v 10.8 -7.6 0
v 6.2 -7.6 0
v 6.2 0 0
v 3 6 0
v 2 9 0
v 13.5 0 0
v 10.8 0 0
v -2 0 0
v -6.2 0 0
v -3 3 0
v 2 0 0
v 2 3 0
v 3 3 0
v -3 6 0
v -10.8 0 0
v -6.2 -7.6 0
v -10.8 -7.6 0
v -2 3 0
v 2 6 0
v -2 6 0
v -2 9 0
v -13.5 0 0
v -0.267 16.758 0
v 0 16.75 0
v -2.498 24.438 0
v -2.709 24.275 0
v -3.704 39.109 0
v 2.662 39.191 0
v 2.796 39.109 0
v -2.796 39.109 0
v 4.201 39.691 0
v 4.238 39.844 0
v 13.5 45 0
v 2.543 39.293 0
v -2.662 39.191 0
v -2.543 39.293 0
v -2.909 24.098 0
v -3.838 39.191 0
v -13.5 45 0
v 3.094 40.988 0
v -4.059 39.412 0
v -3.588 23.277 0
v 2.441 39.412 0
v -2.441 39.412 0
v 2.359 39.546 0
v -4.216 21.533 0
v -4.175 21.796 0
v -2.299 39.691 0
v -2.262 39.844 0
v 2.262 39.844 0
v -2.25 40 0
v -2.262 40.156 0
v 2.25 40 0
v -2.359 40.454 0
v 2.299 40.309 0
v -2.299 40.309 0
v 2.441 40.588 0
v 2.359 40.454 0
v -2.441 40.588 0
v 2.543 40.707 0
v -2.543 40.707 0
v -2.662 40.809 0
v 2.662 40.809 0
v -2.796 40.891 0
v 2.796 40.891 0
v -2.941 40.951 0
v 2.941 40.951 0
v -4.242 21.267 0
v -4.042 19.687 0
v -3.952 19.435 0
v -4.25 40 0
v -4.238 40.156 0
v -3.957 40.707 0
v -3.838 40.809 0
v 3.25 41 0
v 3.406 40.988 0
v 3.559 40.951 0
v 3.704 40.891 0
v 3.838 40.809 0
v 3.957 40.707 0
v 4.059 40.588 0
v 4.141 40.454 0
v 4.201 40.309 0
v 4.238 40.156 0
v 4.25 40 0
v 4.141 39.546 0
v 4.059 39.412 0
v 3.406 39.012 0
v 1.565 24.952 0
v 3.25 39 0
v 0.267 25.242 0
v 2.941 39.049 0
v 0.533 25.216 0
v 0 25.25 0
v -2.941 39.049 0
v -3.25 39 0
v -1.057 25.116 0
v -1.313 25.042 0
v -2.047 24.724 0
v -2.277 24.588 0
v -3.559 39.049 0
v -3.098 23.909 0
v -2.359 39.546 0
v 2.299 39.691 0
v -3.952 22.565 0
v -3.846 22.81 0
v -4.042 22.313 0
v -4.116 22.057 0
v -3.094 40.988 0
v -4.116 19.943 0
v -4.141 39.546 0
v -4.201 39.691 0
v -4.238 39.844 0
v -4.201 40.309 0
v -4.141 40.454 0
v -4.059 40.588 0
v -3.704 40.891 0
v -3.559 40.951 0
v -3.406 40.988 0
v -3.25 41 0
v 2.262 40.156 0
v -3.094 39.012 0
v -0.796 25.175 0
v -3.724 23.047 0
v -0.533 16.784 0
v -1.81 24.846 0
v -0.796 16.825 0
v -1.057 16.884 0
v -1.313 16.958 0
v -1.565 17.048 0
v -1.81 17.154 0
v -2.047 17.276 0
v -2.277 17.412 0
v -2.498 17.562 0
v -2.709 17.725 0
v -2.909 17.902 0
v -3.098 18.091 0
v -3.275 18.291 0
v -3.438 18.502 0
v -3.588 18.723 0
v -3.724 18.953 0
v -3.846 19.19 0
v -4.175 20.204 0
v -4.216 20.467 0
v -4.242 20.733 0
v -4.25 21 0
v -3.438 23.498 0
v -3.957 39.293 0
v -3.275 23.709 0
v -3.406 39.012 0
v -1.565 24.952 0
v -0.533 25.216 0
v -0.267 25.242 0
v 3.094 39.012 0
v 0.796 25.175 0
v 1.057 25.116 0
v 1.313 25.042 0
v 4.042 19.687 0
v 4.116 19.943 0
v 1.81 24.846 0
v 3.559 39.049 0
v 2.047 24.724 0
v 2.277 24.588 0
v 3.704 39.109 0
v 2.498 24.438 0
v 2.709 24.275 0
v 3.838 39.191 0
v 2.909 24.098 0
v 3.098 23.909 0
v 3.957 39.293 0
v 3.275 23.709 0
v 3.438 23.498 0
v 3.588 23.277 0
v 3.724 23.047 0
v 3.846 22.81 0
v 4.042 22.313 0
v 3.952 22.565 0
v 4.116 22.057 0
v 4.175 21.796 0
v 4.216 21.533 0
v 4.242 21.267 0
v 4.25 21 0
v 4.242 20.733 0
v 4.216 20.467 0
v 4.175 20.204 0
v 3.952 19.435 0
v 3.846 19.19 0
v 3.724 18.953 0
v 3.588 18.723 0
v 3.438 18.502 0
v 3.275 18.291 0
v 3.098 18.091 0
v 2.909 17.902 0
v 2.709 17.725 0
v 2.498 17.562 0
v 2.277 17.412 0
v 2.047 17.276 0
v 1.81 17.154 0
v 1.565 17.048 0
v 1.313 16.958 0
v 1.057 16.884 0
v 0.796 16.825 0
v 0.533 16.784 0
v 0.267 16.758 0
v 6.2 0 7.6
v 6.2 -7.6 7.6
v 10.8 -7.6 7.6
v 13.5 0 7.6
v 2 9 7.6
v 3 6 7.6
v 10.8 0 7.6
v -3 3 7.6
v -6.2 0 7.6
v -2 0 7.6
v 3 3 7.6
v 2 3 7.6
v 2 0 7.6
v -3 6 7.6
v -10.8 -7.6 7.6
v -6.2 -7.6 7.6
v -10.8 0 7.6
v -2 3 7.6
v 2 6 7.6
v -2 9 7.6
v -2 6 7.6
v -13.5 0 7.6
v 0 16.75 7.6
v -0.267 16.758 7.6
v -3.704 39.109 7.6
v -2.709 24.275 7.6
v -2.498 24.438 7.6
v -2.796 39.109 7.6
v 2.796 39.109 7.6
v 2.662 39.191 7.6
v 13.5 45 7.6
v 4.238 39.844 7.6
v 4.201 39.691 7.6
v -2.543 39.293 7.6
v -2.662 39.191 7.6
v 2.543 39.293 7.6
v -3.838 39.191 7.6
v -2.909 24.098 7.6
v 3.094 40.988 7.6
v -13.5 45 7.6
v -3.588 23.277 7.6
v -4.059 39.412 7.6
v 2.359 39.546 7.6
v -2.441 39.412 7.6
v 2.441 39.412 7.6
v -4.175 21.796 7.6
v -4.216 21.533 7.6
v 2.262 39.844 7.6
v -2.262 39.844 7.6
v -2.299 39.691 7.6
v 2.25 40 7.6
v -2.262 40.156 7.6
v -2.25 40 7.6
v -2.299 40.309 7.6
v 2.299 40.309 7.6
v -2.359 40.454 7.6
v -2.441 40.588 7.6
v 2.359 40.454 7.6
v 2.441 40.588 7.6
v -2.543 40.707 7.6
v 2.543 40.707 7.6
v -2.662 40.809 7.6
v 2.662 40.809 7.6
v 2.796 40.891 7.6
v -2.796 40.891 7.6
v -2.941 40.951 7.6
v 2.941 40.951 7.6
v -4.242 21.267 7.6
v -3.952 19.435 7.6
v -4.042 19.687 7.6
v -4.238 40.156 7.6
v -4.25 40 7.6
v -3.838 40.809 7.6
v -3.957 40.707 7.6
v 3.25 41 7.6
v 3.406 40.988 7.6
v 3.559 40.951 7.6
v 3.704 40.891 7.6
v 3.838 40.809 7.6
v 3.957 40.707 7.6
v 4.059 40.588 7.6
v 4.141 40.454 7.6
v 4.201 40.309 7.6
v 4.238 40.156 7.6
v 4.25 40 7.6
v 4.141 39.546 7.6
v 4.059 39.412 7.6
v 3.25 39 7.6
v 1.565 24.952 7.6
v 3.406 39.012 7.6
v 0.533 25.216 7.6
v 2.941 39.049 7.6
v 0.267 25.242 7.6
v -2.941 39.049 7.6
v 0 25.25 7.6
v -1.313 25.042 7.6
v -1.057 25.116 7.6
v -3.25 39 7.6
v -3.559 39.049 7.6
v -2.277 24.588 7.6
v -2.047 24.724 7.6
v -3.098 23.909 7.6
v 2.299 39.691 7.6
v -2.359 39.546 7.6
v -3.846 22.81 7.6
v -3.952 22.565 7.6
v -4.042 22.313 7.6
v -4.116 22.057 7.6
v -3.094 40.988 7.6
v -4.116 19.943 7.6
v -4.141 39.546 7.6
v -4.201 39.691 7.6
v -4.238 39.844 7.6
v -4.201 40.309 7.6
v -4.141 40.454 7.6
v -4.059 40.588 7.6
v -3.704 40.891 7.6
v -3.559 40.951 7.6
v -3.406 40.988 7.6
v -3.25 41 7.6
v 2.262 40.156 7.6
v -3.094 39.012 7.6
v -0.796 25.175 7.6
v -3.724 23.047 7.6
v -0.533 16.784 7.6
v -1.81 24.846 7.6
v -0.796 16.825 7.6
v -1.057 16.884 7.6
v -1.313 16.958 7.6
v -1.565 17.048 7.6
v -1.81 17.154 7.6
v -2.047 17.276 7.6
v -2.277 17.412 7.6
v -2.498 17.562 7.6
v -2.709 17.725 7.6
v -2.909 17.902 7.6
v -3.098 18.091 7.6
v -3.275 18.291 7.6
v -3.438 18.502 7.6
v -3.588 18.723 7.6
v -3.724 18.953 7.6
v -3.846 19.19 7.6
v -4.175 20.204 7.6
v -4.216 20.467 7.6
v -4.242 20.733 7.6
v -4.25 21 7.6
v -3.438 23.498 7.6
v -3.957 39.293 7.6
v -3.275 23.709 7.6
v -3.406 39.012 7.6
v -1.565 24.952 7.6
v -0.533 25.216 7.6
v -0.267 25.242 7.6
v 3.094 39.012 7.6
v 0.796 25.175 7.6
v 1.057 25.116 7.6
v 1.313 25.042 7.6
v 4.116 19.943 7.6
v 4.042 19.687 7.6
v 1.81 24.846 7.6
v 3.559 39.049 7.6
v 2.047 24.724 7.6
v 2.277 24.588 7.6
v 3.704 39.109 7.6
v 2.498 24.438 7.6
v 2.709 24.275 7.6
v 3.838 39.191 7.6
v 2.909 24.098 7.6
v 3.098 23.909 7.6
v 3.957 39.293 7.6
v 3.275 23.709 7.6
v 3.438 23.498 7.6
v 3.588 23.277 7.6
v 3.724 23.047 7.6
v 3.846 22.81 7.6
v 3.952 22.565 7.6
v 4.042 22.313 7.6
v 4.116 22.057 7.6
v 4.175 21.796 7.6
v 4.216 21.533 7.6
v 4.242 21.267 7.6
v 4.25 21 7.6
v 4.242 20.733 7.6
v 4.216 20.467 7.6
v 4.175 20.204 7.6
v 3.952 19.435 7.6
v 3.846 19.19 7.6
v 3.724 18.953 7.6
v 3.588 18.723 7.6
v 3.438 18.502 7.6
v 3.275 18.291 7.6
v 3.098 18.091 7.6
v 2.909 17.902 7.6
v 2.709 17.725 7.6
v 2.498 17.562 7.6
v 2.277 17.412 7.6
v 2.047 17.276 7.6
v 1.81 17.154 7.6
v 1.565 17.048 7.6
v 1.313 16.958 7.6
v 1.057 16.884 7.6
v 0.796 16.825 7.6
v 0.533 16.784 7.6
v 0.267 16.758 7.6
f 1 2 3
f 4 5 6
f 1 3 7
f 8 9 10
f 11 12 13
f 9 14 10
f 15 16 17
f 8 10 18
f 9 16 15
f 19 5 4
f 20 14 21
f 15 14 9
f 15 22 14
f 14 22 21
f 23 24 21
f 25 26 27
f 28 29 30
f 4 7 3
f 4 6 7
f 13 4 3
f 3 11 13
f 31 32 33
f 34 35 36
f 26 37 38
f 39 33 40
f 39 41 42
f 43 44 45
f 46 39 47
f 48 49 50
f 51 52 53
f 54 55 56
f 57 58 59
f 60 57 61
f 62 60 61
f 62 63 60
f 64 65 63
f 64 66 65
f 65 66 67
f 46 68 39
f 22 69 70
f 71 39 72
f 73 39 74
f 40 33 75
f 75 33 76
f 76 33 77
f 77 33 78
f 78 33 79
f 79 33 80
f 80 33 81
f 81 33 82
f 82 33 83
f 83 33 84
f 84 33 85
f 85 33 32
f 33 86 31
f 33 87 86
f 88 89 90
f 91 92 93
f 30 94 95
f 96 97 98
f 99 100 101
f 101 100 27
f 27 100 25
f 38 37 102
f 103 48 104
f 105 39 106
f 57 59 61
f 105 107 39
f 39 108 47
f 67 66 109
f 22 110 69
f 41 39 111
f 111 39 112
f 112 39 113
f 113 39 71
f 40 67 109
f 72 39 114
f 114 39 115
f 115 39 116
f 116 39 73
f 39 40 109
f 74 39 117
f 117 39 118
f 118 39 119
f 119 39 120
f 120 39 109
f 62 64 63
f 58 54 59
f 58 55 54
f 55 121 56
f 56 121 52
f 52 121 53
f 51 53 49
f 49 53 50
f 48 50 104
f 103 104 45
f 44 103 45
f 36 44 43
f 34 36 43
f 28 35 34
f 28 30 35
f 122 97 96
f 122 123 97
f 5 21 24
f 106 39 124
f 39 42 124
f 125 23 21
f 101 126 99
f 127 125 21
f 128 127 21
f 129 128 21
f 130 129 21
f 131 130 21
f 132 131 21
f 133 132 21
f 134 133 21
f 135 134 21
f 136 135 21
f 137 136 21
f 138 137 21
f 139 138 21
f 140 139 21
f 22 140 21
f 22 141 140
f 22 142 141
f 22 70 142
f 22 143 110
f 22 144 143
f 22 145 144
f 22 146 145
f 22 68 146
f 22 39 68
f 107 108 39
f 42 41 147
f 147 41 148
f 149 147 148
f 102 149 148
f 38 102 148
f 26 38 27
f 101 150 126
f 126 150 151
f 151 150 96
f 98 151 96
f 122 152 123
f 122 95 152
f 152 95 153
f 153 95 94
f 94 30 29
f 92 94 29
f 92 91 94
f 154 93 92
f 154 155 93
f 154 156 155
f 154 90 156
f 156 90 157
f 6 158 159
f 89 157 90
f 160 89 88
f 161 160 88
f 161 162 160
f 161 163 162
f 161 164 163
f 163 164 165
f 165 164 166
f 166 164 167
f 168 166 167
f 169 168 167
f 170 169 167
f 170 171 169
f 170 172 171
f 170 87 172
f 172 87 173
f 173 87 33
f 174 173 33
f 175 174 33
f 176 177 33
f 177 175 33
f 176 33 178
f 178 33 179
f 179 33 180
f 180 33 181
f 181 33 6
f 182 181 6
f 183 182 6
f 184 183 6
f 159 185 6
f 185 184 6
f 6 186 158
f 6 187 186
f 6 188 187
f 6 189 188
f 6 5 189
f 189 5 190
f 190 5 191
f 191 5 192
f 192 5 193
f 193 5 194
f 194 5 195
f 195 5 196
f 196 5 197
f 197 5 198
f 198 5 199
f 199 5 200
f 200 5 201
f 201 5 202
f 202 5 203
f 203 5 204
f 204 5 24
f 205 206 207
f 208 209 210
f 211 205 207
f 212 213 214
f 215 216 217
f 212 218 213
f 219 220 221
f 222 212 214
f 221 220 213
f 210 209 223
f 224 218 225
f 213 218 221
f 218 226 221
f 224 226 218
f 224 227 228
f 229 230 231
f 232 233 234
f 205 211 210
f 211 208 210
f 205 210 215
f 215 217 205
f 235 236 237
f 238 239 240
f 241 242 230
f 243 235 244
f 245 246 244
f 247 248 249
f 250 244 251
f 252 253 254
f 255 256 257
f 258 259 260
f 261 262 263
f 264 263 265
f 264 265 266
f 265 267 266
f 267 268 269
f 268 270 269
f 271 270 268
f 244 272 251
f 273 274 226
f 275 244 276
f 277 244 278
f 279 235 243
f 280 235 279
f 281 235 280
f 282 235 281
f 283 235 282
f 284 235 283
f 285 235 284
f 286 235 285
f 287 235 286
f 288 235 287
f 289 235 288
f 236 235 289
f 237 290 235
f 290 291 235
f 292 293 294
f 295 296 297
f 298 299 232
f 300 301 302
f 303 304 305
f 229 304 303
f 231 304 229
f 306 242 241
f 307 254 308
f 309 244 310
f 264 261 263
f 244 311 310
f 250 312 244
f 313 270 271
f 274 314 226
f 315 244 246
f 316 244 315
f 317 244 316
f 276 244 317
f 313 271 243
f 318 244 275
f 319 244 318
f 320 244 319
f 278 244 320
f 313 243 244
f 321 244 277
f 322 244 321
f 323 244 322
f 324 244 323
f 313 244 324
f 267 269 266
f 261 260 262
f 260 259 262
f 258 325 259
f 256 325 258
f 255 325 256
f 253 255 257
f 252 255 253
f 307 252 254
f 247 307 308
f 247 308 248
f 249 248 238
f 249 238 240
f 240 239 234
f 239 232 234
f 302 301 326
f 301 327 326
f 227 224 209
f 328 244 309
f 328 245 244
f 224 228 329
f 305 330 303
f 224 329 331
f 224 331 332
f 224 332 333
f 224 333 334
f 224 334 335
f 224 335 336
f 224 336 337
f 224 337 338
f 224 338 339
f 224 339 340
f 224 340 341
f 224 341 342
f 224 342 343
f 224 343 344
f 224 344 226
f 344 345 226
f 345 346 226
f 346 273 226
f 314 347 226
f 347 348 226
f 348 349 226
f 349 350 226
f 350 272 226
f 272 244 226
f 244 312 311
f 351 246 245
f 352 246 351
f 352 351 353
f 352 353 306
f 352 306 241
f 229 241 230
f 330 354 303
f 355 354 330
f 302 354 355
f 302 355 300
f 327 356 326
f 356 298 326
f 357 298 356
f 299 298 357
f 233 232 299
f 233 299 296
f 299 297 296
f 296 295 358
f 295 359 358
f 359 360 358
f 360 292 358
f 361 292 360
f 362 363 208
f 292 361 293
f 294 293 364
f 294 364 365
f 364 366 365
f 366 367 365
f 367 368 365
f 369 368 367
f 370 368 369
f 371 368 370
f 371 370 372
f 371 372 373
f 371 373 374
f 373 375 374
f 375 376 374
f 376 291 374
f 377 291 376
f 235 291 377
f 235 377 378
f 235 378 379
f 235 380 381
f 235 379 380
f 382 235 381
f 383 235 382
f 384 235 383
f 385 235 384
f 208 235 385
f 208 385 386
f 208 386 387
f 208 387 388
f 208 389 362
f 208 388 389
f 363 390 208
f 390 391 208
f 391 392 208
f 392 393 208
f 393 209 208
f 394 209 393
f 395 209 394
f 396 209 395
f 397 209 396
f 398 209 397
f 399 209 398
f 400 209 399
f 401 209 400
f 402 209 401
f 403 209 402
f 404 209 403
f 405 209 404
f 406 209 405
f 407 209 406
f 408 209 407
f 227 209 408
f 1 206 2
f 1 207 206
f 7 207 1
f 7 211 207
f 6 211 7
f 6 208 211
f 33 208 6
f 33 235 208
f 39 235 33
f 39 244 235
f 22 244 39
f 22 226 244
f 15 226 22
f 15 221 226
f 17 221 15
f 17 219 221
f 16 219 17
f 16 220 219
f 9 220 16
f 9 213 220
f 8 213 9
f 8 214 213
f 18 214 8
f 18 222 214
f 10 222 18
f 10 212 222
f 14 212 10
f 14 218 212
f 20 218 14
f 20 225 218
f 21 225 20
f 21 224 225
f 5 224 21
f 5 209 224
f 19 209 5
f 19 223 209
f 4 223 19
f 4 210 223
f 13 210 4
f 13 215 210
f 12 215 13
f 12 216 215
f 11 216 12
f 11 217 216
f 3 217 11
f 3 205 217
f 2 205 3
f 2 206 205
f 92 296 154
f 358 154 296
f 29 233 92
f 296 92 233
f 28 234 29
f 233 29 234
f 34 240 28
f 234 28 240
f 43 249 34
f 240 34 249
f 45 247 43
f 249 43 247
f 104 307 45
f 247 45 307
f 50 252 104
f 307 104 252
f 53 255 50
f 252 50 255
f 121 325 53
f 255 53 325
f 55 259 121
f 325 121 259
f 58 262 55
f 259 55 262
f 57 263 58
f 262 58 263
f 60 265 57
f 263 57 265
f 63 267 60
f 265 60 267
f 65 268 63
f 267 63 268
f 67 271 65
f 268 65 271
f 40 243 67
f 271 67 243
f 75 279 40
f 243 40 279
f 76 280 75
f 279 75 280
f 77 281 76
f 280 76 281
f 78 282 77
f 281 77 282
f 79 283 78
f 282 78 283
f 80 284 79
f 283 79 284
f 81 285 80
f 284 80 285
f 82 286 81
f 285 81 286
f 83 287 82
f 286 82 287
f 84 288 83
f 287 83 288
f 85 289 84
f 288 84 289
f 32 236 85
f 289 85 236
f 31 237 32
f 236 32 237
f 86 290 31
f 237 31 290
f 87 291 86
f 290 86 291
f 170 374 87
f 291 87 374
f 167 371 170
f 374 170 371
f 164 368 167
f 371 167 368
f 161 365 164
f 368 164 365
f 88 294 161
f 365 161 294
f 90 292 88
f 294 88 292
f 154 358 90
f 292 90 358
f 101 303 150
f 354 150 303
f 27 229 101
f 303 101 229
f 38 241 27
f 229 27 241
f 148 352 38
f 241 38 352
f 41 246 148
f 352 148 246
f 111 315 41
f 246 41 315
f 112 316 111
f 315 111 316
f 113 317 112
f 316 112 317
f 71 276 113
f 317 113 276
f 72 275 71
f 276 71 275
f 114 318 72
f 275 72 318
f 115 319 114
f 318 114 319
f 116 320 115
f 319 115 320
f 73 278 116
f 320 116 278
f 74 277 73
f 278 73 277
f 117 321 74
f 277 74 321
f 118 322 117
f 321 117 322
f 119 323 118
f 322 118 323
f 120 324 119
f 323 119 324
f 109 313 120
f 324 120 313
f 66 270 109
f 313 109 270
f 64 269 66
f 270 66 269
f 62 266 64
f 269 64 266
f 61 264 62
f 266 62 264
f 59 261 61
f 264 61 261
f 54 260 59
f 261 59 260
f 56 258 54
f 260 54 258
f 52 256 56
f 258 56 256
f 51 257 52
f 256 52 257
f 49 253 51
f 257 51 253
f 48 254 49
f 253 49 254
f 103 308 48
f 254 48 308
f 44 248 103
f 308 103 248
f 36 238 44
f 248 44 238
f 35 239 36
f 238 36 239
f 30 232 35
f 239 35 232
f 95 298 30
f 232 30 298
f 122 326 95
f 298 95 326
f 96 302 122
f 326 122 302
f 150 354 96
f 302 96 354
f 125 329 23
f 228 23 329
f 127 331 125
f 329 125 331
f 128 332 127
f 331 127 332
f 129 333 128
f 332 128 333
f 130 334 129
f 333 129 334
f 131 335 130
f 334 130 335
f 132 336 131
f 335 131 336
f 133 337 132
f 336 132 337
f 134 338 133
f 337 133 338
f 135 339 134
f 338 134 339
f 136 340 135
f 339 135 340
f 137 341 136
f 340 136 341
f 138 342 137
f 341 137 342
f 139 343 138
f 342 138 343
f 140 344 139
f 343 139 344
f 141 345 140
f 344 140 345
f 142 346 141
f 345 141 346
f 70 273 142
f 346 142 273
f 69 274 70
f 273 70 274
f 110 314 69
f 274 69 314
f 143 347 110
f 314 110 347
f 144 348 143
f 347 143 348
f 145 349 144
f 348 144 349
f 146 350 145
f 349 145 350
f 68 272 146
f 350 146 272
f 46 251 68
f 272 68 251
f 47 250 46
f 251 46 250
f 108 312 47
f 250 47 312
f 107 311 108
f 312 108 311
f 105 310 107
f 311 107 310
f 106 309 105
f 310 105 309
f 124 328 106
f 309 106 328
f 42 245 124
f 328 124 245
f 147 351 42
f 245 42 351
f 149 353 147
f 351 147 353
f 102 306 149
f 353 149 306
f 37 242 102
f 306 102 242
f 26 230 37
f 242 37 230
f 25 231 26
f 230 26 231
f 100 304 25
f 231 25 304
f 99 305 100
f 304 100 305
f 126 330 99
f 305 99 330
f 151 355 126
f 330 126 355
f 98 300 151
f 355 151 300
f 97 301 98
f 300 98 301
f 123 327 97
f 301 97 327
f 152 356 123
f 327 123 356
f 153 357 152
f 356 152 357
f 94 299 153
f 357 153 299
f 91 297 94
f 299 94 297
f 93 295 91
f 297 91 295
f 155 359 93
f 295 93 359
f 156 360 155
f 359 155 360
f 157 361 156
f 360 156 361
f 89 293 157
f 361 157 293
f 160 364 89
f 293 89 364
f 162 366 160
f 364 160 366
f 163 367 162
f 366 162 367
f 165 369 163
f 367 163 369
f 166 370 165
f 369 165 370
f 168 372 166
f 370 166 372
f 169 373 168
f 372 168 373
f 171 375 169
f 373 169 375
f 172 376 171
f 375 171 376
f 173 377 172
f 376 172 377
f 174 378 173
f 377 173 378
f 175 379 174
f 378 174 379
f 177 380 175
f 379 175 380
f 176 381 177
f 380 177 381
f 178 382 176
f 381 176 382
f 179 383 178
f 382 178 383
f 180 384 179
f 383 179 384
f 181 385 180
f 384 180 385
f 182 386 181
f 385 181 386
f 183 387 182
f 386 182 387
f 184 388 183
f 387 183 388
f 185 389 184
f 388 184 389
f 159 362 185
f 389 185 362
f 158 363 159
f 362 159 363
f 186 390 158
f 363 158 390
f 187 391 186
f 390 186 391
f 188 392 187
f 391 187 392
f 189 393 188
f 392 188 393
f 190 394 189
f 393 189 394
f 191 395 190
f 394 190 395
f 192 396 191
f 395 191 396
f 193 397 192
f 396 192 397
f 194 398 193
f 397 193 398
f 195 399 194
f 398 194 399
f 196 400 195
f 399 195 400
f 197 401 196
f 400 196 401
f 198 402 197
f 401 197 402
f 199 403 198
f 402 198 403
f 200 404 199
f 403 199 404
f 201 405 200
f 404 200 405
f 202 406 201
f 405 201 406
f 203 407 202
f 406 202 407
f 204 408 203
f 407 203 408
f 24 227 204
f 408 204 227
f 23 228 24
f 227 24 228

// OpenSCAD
/* 
Author: Kevin Lutzer
Date: February 28 2016 
Description: A part that is meant to hold a limit switch for the positive limit of the y-axis, as well as the bearing. 
Notes: All parts are centered on the positive y-axis onless otherwise specified.

*/

///////////////////////////////// Parameters //////////////////////////////////

//////////////////// Frame Dependant Dimensions 

// thickness of frame material 
thickness = 7.6;
// width of insert that goes into the frame 
frame_insert_width = 4.6;
// dimensions of the base of the part
base_height = 45;
base_width = 27;
// dimensions and position of the bearing, measured from the base of the y-axis 
bearing_displacement = 21;
bearing_hole_diam = 8.5;
// dimensions of screws and nuts used in the joints
screw_height = 9;
screw_width = 4;
nut_height = 3;
nut_width = 6;
// distance between the two frame inserts 
joint_displacement = 8.5;
// dimensions and positions of the limit switch
switch_screw_diam = 2;
switch_screw_width_displacement = 6.5;
switch_screw_height_displacement = 5;


///////////////////////////////// Prototype ////////////////////////////////////

linear_extrude(height = thickness, center = thickness/2, convexity = 10, twist = 0){
    frame();
}

///////////////////////////////// Modules /////////////////////////////////////

// the 2d module of the frame, it needs to be linearly extruded to get the final 3D model of the part
module frame(){
    difference(){
        union(){
            base();    
            translate([-joint_displacement, 0, 0]){
                frame_insert();
            }
            translate([joint_displacement, 0, 0]){
                frame_insert();
            }
        }
        screw_joint();
        translate([0, bearing_displacement, 0]){
            circle(d=bearing_hole_diam, $fn=100);
        }
        translate([0,base_height,0]){
            switch_cutout();
        }
    }
}


// a rectangle that represents the plateform that shapes will be added too, and cut from. 
module base(){
    translate([-base_width/2, 0, 0]){
        square([base_width, base_height]);
    }
}

// the small rectangle that is meant to be the 2D version of the part that inserts into the frame of the 3D printer
module frame_insert(){
    translate([-frame_insert_width/2, -thickness, 0]){
        square([frame_insert_width, thickness]);
    }
}

// the 't' shape that is meant to join the part to the printer.
module screw_joint(){
    union(){
        translate([-screw_width/2, 0]){
            square([screw_width, screw_height]);
        }
        translate([-nut_width/2, screw_height/2-nut_height/2]){
            square([nut_width, nut_height]);
        }
    }
}

// the cutout to for the screw holes to properly position the switch so that the contact is at the edge of the part.
module switch_cutout(){ 
    union(){
        translate([switch_screw_width_displacement/2,-switch_screw_height_displacement,0]){
            circle(d=switch_screw_diam, $fn=40);
        }
        translate([-switch_screw_width_displacement/2,-switch_screw_height_displacement,0]){
            circle(d=switch_screw_diam, $fn=40);
        }
    }
}
